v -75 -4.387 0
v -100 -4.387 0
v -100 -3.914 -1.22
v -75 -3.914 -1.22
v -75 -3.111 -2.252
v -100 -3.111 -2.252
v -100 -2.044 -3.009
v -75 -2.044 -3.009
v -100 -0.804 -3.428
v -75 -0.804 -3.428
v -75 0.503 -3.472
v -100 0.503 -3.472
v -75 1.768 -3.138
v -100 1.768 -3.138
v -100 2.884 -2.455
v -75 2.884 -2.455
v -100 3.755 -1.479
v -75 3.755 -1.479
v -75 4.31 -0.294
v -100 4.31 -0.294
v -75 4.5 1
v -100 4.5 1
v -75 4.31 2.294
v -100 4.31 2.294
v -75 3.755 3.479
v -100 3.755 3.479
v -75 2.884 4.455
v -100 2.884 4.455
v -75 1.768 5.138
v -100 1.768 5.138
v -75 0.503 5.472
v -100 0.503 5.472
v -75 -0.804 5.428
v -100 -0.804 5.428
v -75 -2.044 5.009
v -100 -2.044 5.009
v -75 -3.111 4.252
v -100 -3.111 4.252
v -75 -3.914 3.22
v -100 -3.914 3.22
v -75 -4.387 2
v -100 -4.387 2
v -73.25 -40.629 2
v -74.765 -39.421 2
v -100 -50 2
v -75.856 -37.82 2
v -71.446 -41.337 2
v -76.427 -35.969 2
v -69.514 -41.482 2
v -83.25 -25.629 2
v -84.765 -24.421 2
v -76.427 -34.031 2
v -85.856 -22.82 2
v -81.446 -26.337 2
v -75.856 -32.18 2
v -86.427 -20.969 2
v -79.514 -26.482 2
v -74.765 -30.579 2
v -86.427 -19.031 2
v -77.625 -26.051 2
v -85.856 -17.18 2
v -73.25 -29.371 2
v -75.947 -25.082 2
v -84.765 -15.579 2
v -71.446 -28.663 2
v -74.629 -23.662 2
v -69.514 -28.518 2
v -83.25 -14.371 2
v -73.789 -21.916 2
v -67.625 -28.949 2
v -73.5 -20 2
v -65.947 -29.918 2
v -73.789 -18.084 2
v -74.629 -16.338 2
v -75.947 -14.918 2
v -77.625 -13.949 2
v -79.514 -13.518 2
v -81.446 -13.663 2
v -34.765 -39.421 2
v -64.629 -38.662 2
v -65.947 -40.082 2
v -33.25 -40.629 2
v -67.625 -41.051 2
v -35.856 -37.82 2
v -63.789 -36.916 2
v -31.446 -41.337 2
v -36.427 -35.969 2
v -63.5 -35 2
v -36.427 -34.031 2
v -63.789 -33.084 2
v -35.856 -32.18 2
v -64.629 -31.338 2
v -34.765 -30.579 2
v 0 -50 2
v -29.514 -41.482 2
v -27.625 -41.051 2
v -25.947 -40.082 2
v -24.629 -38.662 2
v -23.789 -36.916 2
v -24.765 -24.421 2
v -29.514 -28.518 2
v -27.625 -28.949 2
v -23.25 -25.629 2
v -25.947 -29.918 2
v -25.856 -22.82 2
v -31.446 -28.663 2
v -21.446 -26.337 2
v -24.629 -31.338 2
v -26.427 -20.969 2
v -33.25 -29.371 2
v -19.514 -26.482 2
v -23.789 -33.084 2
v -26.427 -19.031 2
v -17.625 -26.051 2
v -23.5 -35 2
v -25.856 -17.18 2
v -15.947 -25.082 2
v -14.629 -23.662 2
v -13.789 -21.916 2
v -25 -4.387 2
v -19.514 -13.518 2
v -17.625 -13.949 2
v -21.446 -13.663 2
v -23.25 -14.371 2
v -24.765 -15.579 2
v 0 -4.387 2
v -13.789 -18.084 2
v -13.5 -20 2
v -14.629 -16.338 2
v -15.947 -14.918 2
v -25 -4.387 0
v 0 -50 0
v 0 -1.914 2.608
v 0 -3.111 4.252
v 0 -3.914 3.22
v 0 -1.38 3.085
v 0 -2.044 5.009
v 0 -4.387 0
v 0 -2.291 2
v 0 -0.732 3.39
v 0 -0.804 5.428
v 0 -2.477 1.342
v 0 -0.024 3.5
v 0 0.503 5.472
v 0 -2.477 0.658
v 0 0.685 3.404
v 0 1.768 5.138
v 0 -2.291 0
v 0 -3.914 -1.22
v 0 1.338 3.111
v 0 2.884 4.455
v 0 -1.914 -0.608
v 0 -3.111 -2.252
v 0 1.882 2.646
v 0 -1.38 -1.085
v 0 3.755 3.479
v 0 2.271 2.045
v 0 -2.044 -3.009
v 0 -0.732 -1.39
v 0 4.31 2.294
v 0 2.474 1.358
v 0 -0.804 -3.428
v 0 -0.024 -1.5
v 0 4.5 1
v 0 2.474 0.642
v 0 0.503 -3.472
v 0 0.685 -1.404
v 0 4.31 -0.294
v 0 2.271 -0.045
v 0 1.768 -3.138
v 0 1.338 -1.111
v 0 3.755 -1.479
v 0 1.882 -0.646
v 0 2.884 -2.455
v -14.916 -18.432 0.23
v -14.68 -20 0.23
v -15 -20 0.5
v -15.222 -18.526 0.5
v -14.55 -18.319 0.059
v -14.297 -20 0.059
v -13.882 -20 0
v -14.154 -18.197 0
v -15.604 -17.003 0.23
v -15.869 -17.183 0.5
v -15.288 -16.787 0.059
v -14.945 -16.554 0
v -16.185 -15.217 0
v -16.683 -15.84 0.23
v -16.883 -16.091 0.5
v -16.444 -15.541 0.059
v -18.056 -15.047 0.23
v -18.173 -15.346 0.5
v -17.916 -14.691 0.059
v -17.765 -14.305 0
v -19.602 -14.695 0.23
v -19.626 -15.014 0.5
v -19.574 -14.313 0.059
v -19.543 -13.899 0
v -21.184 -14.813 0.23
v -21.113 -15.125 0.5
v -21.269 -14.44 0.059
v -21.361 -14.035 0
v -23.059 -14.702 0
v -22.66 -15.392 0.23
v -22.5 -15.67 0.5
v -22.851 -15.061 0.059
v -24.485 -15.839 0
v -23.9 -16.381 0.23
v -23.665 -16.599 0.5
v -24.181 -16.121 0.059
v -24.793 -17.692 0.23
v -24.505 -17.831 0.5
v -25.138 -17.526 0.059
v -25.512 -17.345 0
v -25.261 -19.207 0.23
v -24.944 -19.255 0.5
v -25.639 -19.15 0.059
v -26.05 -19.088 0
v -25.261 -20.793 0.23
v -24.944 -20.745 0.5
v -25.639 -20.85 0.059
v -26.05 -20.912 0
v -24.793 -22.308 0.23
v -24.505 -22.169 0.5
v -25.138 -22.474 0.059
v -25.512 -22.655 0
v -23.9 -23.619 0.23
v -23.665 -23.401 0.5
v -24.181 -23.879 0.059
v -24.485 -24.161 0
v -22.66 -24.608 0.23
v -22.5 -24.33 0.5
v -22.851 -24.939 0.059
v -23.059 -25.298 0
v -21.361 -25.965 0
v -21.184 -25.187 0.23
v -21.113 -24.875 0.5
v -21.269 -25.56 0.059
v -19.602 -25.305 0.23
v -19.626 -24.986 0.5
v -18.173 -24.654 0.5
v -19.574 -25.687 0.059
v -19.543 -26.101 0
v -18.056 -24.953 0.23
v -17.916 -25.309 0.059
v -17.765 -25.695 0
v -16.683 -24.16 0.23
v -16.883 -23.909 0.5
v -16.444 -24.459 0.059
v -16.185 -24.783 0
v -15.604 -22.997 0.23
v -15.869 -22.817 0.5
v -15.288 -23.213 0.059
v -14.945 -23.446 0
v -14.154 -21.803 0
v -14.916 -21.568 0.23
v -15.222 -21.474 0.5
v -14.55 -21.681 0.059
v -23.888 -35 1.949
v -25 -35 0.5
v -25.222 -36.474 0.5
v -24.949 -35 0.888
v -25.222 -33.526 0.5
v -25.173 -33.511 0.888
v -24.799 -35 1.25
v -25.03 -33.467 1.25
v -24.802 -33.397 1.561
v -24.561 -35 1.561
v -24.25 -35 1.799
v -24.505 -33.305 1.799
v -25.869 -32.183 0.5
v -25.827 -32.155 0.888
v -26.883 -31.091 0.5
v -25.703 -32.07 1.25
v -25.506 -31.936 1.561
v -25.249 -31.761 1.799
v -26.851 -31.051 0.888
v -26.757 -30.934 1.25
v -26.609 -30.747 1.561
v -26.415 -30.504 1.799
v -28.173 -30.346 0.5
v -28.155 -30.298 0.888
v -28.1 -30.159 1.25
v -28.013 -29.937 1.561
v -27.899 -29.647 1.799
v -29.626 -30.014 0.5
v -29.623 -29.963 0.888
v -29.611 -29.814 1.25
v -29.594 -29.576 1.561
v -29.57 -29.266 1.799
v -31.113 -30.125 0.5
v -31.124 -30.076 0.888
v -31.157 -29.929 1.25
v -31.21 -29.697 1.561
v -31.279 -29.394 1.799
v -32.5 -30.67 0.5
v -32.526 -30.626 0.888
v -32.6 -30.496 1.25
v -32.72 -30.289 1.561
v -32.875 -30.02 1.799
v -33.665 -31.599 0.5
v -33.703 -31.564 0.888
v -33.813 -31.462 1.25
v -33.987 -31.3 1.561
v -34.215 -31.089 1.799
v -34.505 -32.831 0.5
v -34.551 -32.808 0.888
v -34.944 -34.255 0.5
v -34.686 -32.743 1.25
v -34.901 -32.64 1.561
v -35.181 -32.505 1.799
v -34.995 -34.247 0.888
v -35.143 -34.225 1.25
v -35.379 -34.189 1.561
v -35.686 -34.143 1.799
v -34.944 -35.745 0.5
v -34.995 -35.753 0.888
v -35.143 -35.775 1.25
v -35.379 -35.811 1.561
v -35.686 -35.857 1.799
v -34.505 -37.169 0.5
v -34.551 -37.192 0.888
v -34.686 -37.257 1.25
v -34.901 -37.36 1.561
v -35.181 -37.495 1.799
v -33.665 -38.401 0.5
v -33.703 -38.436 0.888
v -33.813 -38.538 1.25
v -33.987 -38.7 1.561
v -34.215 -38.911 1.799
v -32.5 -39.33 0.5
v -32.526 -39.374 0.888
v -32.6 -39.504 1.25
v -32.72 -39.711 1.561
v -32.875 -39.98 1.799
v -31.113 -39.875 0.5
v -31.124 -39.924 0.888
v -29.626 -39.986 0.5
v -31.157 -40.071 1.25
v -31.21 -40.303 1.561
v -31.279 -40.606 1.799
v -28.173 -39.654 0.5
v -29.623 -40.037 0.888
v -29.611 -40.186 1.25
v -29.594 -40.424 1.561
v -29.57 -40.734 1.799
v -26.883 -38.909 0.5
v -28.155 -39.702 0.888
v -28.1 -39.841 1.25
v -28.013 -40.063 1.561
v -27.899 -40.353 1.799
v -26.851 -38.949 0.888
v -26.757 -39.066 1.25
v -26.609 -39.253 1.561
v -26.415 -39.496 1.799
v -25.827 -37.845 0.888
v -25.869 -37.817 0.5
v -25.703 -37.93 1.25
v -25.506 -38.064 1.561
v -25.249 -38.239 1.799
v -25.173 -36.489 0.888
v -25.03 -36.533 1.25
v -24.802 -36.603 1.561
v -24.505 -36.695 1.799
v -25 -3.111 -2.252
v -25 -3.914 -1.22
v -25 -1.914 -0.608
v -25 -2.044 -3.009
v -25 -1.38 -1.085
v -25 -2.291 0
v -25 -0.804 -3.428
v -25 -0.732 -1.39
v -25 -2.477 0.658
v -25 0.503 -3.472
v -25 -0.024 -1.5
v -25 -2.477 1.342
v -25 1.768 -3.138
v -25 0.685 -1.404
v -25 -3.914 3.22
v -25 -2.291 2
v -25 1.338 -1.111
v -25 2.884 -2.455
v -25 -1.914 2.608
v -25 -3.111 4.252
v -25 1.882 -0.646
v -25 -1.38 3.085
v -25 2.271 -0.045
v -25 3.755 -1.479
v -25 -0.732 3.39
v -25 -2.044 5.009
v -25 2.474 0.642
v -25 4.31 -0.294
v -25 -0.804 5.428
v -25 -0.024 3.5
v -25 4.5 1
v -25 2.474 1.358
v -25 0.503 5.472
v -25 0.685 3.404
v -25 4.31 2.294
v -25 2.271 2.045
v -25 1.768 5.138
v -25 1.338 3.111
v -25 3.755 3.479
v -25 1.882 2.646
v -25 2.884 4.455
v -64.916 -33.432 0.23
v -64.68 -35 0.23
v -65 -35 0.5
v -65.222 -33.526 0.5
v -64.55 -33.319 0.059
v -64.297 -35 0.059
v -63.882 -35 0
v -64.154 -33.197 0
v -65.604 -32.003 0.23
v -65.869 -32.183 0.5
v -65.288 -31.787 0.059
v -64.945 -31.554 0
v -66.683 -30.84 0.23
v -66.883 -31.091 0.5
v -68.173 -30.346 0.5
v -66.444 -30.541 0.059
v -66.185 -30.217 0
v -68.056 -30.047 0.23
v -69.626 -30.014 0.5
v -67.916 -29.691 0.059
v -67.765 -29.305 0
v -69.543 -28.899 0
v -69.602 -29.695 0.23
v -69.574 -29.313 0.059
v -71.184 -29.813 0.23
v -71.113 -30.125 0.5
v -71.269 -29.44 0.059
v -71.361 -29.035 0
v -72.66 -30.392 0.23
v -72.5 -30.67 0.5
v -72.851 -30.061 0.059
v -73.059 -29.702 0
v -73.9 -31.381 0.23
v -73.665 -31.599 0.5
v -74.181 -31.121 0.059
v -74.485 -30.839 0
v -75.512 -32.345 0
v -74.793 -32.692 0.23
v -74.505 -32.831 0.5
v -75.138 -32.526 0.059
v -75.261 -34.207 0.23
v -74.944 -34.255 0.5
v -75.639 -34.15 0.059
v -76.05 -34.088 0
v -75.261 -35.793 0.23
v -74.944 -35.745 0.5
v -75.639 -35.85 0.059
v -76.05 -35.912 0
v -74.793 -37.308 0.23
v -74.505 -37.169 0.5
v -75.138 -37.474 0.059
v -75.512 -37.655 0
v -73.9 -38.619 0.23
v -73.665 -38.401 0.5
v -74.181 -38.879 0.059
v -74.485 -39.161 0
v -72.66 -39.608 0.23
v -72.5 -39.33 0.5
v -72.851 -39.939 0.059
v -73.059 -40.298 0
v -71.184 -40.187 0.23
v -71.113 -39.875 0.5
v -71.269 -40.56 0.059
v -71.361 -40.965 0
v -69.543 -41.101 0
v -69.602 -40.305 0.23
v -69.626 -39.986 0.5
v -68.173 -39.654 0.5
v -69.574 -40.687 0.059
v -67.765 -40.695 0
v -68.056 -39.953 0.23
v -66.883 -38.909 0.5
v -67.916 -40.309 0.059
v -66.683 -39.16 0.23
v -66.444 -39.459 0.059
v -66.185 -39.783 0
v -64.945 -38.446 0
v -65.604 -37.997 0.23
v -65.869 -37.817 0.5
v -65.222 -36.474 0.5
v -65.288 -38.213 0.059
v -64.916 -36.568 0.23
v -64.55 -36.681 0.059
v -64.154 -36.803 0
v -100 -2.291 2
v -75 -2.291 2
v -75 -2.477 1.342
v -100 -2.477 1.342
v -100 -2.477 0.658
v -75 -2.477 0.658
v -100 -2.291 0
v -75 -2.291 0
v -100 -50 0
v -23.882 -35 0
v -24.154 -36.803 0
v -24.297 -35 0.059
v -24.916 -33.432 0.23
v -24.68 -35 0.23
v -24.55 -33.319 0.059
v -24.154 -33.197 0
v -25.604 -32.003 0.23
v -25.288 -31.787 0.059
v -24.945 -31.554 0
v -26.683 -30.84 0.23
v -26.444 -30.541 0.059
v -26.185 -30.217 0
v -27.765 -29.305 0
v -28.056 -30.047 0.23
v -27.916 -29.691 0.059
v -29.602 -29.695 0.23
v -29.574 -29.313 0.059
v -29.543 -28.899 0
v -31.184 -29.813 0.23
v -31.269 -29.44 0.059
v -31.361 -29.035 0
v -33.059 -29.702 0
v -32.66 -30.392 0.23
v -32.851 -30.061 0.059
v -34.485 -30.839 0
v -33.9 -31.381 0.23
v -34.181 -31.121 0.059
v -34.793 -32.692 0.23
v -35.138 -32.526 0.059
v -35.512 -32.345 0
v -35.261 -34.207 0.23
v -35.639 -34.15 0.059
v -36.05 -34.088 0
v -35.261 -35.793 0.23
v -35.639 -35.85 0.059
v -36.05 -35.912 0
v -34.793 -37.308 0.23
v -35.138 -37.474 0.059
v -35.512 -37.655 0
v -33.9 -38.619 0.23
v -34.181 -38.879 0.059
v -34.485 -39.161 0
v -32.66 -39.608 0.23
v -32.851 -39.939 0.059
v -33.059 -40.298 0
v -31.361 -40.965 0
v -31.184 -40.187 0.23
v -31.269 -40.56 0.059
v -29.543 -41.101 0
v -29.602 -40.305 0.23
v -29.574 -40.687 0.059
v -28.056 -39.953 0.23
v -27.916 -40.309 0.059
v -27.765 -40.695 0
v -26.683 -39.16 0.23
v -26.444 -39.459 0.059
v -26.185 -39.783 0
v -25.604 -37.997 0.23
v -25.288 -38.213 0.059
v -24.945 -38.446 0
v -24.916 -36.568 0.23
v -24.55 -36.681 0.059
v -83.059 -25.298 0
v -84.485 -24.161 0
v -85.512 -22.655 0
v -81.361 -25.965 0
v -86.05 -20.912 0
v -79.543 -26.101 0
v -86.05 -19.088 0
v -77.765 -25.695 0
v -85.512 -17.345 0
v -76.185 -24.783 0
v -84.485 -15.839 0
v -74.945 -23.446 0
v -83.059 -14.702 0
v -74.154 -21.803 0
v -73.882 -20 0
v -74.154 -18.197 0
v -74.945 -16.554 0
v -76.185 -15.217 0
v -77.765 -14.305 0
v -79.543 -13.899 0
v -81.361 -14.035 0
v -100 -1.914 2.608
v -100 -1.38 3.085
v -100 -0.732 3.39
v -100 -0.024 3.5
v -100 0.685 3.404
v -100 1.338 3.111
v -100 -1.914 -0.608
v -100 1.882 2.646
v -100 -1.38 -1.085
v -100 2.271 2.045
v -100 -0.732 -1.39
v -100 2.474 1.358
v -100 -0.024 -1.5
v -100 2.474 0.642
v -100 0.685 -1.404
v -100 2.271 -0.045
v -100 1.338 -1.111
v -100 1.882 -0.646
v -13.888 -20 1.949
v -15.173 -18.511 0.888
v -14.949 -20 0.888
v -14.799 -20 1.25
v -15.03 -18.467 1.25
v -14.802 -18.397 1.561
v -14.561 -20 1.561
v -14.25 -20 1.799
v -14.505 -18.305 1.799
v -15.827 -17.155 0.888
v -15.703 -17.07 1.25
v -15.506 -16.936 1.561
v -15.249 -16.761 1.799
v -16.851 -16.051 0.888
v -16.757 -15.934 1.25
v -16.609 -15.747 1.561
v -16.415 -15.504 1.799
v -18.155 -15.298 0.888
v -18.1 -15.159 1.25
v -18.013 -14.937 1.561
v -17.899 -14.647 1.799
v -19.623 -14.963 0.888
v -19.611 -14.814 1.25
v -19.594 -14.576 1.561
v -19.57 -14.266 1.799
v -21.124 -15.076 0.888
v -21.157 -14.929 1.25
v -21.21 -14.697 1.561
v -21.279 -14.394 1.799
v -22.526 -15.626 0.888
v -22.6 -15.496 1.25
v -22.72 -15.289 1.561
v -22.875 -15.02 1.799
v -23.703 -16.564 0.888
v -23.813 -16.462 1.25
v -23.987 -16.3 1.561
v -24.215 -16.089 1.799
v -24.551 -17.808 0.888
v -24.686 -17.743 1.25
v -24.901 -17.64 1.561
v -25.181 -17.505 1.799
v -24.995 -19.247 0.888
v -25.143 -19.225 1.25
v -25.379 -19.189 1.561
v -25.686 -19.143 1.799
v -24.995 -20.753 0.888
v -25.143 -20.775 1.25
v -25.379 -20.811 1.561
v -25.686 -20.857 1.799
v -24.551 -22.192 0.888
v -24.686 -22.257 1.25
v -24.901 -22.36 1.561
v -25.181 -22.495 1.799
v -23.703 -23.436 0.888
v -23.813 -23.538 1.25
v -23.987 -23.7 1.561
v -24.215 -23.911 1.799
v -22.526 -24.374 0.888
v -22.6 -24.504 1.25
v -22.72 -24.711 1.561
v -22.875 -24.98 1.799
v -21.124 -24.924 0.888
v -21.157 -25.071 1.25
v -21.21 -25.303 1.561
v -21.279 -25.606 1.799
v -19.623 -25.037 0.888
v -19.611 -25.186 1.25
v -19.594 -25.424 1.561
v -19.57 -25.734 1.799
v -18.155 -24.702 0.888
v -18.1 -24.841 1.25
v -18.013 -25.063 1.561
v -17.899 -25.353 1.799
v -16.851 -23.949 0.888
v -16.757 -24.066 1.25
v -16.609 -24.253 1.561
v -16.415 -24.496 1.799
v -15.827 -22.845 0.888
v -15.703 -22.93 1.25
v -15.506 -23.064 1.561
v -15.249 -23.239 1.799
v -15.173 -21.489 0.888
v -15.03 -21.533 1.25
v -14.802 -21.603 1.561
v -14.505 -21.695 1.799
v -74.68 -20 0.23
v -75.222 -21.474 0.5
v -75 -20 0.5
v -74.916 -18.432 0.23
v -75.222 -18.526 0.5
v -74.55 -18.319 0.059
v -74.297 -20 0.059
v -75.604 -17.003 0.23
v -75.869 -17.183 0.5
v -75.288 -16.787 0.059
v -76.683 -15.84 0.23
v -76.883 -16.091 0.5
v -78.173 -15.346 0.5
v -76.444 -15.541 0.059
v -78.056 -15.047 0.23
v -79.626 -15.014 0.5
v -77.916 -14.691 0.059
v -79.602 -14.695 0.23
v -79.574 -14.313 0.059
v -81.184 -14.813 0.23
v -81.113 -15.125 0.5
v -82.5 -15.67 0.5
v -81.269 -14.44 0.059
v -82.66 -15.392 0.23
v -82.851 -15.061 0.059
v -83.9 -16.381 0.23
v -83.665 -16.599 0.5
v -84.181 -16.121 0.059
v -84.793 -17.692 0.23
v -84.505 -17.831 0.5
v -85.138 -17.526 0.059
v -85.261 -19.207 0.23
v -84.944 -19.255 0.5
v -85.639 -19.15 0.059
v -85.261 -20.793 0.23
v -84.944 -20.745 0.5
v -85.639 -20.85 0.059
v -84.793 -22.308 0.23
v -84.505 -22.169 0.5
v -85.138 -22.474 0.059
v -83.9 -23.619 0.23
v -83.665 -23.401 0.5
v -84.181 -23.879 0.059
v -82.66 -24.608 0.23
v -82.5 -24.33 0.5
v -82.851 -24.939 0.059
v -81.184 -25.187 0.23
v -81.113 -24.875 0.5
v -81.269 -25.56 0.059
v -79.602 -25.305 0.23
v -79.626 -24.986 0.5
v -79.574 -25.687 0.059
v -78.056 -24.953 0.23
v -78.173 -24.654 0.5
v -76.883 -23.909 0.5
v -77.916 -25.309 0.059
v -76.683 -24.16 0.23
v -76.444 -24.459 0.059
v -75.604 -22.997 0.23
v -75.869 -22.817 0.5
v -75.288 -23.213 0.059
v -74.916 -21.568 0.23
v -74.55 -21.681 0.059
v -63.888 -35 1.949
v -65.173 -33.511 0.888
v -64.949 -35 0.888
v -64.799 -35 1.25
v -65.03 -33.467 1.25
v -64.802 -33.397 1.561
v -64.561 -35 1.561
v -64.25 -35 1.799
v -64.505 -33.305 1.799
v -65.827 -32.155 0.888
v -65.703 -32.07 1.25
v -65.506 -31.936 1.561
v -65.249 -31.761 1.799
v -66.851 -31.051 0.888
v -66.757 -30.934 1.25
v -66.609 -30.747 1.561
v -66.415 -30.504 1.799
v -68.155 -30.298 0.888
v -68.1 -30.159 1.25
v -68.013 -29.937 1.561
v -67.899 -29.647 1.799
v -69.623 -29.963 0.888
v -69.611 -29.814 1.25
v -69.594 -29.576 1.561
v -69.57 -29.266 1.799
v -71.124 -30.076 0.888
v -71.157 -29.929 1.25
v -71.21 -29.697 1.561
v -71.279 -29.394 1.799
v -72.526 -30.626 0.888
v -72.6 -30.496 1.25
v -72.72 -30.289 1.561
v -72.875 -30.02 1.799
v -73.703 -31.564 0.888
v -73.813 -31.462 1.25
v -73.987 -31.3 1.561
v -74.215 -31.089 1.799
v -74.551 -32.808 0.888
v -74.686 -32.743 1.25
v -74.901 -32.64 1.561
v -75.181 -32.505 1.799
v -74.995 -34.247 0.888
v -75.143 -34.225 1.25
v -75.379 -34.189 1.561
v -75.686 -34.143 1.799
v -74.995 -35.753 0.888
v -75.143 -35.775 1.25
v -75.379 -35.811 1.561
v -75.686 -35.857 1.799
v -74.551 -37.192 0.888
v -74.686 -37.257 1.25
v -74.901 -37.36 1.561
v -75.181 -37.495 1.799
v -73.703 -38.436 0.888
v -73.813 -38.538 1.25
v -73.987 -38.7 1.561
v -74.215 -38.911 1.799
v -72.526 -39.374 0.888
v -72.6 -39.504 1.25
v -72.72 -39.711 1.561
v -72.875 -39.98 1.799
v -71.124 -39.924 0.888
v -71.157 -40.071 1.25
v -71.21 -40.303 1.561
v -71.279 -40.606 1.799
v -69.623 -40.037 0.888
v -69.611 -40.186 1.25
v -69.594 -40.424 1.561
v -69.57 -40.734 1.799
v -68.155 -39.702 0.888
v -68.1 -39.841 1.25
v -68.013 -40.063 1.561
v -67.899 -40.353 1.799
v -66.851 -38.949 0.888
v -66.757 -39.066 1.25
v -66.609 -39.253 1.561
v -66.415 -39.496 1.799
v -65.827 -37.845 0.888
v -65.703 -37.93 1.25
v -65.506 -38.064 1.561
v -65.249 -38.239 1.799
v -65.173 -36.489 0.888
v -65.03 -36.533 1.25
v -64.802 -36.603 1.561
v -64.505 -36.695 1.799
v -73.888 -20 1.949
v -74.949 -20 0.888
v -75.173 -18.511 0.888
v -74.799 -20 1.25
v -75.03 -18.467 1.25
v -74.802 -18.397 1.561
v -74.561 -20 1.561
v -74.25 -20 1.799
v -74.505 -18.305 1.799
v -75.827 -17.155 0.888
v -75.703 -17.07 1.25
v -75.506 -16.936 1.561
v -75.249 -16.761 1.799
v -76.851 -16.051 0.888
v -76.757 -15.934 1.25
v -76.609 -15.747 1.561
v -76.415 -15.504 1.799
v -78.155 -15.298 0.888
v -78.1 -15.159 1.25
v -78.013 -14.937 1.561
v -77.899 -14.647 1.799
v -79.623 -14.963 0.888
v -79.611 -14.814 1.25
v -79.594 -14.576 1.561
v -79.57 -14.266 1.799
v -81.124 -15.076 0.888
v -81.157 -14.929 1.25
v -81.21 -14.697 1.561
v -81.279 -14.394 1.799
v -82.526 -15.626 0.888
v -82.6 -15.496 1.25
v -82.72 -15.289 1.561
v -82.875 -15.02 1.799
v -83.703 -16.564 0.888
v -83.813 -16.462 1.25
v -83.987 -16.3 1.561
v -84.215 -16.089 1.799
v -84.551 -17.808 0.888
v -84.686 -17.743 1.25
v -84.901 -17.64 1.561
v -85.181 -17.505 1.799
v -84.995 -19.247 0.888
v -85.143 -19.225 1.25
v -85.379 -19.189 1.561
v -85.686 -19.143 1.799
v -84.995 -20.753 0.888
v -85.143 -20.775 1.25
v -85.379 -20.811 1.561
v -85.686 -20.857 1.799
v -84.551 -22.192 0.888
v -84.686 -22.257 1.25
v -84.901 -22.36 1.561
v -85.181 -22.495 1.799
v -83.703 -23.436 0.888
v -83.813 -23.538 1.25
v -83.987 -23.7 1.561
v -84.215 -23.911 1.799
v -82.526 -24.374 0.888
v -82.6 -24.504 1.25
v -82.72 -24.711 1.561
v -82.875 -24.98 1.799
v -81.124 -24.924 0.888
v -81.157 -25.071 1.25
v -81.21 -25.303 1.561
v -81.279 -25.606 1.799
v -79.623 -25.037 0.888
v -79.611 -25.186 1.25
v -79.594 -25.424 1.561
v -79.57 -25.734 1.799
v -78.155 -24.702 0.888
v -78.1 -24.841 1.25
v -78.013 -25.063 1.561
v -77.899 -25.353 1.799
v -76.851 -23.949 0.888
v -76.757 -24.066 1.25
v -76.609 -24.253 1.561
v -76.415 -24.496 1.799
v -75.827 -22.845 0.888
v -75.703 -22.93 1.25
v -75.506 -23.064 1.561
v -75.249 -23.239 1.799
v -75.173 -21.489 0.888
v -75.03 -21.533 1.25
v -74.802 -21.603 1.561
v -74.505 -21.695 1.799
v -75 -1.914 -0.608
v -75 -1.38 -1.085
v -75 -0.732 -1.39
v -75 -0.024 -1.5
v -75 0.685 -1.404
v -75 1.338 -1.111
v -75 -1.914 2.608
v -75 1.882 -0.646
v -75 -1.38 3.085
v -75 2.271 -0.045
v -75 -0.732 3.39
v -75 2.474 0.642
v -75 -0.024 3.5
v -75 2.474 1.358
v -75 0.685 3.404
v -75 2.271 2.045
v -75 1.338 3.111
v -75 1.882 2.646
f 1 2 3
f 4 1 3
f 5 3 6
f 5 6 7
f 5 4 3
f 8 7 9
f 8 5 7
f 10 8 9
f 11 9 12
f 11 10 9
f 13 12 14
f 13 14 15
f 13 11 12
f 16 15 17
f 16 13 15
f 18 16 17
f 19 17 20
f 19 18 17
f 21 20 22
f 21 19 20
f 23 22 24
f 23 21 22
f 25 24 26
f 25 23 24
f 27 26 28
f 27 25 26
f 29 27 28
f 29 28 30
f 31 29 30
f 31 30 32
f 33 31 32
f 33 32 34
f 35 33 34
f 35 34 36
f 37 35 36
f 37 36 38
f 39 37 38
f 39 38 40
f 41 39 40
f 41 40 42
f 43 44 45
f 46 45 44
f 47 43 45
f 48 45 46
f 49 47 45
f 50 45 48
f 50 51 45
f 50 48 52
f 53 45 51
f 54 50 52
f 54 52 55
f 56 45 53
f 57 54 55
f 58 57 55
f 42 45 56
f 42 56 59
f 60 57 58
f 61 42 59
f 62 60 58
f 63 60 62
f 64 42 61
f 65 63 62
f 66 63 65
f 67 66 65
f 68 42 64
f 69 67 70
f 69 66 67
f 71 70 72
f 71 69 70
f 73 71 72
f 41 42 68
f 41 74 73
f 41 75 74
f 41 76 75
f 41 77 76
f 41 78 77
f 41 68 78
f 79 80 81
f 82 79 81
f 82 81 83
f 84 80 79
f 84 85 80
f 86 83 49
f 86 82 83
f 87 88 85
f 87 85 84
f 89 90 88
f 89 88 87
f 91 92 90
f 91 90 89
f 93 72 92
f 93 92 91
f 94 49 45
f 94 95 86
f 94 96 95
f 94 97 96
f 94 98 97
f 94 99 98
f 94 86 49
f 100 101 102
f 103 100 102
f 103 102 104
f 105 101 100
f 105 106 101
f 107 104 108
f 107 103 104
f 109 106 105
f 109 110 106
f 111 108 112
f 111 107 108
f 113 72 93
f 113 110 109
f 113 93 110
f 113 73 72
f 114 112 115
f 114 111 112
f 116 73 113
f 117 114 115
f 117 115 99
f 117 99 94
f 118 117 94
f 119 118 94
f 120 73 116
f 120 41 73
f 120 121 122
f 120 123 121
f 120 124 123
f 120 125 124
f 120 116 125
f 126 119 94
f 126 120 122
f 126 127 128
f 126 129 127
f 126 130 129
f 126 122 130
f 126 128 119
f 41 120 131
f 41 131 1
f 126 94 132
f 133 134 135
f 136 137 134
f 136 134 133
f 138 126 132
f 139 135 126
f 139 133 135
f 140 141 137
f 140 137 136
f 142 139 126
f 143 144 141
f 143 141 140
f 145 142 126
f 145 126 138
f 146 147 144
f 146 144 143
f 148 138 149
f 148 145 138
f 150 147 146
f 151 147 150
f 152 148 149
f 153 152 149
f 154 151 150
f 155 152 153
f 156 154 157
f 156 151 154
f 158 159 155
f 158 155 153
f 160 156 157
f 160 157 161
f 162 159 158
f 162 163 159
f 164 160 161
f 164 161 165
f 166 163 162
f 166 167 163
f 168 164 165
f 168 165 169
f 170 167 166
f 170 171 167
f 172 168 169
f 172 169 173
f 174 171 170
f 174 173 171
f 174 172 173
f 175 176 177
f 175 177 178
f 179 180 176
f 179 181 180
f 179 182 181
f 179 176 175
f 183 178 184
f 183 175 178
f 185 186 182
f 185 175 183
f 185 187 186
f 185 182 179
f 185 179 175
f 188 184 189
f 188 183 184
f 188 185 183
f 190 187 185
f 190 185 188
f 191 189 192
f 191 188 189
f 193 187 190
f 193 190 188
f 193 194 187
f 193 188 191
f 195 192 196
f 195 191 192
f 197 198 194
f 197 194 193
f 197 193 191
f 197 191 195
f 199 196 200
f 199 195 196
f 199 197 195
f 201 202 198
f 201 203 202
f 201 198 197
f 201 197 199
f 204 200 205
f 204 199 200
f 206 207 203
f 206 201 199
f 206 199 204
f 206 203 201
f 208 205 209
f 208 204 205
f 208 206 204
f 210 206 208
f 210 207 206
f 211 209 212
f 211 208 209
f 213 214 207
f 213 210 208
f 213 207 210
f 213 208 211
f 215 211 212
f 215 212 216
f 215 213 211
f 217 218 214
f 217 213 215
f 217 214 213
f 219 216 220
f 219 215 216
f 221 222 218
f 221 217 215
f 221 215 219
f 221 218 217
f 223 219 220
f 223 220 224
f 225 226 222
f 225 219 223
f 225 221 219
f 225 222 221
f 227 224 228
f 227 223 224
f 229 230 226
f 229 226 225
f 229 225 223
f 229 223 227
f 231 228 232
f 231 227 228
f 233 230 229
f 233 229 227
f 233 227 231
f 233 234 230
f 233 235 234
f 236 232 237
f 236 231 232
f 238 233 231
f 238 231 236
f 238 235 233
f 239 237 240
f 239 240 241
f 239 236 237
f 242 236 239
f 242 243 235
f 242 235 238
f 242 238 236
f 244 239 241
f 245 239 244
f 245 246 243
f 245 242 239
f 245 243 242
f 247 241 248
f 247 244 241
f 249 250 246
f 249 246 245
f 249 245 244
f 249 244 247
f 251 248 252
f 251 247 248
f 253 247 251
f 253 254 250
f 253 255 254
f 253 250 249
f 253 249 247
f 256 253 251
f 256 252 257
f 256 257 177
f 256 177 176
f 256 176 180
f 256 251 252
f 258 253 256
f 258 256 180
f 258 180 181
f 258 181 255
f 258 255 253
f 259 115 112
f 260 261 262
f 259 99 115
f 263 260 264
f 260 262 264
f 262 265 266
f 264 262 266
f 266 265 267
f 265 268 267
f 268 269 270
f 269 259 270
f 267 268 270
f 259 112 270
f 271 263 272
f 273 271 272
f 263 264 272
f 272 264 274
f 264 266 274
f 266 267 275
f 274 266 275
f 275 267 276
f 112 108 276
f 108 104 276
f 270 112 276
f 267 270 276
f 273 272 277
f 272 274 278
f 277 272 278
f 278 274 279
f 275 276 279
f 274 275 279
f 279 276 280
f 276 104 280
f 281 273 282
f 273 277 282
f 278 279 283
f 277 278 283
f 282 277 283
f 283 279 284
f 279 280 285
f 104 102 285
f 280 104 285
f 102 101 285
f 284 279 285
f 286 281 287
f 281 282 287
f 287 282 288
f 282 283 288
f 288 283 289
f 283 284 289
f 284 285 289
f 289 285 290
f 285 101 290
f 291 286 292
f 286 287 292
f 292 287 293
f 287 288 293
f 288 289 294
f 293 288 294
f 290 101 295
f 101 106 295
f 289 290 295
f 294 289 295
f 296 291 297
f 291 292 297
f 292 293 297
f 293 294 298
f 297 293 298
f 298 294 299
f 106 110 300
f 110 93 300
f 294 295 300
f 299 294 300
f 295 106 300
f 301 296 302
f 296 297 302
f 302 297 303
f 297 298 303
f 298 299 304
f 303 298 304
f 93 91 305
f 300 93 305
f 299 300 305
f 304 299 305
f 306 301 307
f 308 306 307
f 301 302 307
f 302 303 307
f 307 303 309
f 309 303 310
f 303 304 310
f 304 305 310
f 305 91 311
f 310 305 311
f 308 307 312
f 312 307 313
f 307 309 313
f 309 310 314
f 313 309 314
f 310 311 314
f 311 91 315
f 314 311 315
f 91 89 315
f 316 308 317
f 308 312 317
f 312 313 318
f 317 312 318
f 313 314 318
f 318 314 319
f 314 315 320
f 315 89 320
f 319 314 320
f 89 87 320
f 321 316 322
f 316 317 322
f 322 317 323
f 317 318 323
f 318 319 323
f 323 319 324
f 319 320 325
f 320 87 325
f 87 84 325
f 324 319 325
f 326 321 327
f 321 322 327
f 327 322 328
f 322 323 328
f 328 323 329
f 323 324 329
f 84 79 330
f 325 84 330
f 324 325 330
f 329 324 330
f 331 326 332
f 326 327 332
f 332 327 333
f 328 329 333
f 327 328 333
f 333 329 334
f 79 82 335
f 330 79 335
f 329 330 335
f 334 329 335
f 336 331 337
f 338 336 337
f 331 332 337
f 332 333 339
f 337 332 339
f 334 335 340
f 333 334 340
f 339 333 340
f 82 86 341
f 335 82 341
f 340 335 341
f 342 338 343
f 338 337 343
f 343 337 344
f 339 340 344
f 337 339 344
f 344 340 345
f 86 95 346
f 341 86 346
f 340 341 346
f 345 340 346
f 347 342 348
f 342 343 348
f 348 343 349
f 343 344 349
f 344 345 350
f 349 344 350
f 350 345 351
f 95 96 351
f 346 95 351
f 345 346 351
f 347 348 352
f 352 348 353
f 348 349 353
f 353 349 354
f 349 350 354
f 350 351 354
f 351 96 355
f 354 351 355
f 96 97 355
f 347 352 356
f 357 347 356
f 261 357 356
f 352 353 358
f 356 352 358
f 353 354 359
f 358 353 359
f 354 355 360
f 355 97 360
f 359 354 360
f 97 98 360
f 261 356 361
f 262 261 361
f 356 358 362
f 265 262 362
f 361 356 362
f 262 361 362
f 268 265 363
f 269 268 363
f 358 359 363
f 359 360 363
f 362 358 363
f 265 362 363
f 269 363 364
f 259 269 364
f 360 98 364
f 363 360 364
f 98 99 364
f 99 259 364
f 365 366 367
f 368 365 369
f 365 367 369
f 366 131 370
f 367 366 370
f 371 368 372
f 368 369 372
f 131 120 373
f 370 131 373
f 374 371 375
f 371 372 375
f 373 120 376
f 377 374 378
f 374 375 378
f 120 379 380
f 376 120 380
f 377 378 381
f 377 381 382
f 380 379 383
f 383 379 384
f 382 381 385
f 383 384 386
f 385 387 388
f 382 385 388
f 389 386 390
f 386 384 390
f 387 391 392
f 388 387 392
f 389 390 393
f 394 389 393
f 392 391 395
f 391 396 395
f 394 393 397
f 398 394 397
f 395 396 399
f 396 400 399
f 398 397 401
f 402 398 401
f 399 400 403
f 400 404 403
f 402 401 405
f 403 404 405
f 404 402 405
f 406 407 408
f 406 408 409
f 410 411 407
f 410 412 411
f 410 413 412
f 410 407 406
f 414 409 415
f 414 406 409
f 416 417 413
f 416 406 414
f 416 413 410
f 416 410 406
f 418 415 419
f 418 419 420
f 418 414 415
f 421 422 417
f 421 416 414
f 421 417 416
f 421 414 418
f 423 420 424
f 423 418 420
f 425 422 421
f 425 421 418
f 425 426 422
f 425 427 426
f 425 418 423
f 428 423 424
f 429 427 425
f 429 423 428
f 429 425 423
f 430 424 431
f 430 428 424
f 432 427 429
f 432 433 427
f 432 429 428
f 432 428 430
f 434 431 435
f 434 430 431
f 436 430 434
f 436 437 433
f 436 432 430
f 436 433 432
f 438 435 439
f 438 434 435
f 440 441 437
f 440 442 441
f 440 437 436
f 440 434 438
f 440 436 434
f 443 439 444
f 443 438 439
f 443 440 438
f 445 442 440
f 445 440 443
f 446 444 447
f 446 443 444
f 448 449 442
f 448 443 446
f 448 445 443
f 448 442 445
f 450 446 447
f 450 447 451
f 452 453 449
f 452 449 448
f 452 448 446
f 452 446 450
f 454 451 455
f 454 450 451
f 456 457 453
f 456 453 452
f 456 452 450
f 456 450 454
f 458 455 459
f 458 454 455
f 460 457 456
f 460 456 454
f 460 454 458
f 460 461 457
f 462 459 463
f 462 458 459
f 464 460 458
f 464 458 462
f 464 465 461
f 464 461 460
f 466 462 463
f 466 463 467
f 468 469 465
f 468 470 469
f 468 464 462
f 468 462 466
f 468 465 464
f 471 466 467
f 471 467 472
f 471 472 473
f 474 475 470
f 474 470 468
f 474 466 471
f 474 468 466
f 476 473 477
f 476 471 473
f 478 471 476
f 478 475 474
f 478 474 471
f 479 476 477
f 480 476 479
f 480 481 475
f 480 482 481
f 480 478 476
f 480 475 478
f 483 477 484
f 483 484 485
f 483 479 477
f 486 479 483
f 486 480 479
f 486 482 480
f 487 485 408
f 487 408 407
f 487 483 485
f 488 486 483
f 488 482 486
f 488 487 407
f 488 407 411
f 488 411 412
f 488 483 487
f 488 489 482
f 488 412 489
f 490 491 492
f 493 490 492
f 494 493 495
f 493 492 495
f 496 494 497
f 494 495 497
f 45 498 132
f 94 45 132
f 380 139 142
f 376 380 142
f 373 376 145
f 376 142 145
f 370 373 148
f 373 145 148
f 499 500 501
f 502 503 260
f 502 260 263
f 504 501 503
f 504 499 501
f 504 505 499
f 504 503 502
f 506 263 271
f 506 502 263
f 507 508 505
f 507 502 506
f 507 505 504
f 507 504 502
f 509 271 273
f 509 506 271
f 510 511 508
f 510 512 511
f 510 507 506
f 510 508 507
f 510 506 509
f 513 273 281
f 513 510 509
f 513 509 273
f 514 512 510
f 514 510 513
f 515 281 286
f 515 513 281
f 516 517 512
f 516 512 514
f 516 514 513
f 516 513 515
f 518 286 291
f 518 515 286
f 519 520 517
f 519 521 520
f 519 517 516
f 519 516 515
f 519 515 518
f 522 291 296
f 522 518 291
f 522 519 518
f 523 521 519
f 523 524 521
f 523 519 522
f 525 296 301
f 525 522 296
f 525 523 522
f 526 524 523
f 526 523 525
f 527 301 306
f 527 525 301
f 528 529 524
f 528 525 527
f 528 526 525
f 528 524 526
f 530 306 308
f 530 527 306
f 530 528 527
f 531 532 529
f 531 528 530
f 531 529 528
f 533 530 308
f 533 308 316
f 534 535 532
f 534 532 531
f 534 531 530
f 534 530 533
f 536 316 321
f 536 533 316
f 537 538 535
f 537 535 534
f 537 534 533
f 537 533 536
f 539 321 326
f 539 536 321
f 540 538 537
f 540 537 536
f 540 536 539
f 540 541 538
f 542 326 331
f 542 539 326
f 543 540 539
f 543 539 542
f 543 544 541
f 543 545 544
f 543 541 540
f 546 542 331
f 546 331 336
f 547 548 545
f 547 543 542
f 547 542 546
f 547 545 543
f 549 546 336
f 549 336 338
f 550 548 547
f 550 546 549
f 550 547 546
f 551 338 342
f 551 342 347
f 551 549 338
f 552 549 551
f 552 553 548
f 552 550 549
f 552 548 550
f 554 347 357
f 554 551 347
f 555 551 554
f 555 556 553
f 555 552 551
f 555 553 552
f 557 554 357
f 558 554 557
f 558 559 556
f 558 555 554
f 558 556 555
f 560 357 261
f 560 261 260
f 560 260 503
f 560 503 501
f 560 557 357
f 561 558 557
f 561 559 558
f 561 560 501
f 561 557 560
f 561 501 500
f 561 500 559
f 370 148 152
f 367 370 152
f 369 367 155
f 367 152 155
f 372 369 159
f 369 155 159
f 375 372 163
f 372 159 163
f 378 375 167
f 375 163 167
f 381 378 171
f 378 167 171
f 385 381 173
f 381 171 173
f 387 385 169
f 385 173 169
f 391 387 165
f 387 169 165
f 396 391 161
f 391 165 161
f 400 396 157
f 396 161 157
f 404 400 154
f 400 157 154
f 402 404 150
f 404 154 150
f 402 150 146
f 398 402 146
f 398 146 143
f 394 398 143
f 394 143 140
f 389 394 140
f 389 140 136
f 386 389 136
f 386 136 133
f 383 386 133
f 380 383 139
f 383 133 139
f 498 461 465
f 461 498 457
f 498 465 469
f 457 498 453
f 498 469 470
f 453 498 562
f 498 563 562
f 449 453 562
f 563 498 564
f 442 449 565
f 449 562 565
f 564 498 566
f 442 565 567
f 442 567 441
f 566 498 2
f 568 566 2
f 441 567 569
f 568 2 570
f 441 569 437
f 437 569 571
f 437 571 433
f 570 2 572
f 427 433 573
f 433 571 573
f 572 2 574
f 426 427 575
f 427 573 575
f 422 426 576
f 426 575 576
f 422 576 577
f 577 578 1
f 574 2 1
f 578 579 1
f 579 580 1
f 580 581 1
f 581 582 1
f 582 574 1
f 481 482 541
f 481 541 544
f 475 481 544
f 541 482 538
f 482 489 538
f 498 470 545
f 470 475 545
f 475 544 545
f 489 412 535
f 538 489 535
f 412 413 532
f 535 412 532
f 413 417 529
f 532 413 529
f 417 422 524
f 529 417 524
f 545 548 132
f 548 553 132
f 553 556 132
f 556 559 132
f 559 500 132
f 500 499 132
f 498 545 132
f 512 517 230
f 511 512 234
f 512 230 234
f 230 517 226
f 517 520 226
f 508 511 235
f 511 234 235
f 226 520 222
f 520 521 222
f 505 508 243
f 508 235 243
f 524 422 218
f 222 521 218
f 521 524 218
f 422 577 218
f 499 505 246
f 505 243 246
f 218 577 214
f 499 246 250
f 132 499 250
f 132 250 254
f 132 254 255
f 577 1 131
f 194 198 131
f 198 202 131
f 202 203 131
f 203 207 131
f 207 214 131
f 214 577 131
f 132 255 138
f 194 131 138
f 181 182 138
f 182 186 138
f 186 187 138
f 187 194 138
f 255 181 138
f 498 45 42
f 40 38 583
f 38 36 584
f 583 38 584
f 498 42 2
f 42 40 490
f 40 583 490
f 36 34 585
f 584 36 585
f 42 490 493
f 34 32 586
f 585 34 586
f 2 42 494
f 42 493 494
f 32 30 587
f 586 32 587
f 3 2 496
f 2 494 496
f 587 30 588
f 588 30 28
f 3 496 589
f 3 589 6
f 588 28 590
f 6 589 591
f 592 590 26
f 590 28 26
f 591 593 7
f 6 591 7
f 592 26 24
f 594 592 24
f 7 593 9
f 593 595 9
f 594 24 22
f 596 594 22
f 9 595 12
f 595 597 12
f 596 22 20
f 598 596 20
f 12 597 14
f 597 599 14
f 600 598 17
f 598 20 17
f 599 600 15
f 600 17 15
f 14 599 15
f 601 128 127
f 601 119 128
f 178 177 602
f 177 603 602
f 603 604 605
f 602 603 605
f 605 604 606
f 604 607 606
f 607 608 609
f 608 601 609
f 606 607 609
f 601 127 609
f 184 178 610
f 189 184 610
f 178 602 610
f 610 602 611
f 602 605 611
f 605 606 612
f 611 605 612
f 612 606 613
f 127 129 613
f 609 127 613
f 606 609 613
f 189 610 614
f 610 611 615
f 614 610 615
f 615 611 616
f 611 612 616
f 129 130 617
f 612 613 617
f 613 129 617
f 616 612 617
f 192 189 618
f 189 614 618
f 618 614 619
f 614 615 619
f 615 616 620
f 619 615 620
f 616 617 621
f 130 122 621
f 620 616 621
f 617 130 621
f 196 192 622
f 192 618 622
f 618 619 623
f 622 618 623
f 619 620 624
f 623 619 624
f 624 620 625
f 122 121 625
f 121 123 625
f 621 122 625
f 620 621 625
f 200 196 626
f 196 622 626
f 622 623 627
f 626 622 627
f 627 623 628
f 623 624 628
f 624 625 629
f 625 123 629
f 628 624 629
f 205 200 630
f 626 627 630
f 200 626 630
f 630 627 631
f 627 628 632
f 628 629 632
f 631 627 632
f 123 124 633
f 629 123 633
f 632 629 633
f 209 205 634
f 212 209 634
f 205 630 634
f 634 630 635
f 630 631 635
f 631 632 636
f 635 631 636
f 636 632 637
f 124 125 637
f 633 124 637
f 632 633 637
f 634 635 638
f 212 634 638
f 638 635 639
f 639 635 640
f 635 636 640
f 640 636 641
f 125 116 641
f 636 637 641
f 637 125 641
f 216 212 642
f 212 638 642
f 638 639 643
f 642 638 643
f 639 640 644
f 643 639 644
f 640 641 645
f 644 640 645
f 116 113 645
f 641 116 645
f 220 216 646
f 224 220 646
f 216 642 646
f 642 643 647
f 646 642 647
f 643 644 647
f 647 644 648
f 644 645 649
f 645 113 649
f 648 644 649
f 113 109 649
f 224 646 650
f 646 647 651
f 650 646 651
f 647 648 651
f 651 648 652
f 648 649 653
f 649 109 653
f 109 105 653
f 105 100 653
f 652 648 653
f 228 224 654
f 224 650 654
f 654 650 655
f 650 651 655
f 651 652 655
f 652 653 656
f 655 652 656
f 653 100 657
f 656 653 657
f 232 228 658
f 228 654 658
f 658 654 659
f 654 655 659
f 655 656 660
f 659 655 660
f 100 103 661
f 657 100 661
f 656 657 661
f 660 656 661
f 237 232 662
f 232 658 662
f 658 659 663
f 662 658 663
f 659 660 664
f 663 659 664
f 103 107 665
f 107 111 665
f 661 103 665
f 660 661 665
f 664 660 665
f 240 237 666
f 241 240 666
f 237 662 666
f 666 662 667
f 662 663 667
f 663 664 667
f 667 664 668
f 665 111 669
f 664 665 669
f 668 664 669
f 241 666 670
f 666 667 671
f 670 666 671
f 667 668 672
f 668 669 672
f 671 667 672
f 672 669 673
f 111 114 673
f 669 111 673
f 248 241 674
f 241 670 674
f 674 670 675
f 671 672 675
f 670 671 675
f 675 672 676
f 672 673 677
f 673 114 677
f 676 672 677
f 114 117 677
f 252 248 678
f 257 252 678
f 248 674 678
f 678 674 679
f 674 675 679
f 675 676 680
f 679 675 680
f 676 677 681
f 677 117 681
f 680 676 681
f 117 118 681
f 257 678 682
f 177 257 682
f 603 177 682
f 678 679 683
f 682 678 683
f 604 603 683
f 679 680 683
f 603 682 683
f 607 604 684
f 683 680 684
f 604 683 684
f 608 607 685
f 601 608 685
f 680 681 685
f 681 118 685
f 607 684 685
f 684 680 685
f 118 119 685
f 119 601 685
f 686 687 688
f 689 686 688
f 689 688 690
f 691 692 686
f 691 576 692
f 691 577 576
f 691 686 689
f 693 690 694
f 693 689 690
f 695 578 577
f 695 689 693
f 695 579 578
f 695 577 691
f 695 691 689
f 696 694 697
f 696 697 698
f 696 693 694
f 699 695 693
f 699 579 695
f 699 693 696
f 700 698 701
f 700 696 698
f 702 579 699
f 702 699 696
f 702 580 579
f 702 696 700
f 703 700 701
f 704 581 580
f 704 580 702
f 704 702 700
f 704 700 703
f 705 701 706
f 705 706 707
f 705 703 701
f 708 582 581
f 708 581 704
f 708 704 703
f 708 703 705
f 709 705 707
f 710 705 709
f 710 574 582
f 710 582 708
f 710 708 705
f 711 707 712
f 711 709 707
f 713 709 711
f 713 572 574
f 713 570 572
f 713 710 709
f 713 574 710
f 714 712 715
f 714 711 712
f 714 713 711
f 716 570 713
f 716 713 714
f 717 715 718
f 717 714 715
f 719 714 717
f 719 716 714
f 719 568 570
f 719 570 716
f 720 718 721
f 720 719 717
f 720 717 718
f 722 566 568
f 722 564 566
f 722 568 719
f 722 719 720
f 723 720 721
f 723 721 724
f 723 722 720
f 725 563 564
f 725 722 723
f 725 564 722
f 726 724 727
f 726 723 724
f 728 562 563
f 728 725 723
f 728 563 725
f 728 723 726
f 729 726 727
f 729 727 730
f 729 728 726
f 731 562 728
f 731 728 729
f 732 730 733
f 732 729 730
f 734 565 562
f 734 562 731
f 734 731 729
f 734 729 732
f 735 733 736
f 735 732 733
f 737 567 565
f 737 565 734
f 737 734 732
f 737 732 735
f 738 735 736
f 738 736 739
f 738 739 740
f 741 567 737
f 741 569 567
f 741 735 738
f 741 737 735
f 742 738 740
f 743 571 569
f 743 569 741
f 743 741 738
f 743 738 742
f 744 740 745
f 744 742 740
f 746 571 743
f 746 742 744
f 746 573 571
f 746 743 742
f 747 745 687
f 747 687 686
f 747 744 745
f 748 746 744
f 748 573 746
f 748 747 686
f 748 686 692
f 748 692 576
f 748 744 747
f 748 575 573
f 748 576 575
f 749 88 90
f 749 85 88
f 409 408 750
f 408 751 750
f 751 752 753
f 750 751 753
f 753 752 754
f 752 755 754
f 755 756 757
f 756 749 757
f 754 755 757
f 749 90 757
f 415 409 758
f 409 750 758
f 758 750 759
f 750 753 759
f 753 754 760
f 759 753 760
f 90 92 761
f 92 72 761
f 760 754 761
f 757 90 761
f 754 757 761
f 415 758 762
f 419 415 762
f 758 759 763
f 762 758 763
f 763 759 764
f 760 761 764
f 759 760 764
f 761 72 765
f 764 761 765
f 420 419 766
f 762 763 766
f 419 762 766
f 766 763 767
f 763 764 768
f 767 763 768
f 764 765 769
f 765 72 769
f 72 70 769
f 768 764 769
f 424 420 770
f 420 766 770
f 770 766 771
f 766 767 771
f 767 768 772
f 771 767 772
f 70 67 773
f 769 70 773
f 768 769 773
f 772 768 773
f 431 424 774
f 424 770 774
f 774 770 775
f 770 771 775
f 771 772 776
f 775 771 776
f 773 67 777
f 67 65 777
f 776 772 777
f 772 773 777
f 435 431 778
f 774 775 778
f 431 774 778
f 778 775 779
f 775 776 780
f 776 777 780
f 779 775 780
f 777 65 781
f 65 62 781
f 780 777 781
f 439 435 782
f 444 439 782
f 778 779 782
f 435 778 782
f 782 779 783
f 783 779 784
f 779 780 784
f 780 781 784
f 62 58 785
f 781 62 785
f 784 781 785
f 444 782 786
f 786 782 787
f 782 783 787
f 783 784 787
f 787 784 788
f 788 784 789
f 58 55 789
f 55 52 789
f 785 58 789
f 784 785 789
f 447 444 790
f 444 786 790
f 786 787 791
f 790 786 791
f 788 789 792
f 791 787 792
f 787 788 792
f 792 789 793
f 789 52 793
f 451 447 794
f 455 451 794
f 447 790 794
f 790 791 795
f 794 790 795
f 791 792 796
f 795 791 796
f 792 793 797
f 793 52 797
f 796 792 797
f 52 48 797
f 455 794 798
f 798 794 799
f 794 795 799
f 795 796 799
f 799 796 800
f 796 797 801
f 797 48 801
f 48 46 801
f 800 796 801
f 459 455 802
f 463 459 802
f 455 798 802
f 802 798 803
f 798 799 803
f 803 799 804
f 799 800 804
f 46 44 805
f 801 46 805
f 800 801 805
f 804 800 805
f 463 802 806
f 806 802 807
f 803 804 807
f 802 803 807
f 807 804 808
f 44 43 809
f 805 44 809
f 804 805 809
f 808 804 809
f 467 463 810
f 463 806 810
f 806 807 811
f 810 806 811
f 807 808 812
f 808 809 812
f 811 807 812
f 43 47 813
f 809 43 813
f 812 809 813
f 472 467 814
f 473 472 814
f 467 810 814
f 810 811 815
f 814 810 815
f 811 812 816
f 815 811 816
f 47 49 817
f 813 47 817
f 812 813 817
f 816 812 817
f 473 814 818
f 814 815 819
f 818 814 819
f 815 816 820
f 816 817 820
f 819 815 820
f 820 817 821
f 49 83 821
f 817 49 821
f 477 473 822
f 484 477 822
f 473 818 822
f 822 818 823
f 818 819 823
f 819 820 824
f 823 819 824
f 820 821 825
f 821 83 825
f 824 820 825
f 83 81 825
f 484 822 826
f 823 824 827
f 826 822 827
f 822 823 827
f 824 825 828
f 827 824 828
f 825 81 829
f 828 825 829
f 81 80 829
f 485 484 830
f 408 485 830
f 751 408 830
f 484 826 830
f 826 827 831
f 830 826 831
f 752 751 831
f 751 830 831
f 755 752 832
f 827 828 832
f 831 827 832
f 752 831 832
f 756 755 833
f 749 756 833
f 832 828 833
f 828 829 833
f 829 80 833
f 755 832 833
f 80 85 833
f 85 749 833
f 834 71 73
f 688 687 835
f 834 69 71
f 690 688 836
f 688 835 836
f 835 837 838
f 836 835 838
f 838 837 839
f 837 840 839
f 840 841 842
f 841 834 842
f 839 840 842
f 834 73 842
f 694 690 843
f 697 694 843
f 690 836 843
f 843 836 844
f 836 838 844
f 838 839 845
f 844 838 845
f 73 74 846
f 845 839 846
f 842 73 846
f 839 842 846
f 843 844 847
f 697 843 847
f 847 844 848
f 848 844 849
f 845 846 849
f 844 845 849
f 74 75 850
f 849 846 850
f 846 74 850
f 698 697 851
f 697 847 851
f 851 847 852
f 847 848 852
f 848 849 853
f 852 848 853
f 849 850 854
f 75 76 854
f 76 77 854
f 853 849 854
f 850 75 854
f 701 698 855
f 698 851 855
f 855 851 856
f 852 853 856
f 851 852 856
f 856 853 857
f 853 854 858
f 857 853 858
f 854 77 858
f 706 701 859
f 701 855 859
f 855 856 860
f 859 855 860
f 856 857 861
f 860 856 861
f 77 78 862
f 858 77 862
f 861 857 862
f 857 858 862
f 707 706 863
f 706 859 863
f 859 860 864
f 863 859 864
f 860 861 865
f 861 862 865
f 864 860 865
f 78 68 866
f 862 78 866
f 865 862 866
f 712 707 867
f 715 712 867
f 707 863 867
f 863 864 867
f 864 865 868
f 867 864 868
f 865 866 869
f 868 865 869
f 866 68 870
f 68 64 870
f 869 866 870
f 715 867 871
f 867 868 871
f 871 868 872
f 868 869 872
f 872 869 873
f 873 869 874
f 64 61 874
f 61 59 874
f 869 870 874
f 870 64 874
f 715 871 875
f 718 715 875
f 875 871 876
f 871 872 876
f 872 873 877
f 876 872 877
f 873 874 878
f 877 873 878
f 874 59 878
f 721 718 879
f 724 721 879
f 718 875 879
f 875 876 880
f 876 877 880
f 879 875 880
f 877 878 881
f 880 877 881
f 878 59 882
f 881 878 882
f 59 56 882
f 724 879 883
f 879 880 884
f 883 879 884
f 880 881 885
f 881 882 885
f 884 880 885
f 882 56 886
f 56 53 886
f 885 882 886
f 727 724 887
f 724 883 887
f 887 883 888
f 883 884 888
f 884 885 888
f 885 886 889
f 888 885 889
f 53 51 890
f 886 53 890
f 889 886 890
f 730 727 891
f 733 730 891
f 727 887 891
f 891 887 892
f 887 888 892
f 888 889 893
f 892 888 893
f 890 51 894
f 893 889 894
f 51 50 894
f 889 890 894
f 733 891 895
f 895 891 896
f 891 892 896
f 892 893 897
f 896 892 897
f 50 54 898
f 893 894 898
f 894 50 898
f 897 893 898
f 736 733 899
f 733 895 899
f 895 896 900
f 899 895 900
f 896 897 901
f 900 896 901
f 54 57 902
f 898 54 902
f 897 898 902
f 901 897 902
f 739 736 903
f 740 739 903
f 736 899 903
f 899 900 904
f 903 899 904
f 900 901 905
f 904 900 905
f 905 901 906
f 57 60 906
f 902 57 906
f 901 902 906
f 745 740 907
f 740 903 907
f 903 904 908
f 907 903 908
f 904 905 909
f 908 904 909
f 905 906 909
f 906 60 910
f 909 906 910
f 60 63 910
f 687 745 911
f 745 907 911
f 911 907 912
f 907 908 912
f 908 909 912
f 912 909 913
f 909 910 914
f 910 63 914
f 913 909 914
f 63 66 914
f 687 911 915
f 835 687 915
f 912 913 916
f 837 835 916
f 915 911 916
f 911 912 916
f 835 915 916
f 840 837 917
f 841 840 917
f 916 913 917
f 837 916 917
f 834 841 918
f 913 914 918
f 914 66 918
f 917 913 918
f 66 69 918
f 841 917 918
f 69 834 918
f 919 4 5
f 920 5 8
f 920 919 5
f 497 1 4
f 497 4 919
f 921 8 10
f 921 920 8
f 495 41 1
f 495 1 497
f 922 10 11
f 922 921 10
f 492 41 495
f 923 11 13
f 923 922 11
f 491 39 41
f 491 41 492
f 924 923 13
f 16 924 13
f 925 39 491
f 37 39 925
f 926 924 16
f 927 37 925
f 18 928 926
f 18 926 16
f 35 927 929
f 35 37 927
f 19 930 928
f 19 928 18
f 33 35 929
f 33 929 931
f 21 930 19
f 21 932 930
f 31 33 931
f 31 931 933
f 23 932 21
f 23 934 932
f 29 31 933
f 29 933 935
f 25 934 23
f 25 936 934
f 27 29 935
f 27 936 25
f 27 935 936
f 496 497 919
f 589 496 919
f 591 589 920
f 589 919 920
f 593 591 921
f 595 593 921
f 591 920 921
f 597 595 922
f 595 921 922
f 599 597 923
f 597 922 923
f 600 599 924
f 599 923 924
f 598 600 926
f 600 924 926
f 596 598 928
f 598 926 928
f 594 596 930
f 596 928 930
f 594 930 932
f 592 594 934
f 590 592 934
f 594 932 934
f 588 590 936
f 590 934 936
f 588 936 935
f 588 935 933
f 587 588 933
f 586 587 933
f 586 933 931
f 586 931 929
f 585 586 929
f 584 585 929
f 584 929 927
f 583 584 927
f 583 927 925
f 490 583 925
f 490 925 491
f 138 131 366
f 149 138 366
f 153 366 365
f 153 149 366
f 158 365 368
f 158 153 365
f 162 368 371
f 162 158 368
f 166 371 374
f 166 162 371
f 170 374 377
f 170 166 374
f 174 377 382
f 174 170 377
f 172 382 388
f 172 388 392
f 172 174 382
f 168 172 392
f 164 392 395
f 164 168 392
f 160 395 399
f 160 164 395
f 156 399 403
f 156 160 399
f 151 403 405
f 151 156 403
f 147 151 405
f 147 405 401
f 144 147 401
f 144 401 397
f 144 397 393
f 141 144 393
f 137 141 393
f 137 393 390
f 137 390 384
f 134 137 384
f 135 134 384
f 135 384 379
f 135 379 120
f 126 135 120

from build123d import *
from build123d.topology import SkipClean

# Parameters (mm, degrees)
ESBO_O1_W                  = 100
ESBO_O1_H                  = 50
ESBO_O1_R                  = 5
RESSALTO_EXTRUS_O1_DEPTH   = 2
FILETE1_R                  = 1.5
FILETE2_R                  = 1.5
ESBO_O2_R                  = 4.5
ESBO_O2_R_2                = 2.5
RESSALTO_EXTRUS_O2_DEPTH   = 100
CORTE_EXTRUS_O1_DEPTH      = 112.938599241
CORTE_EXTRUS_O2_DEPTH      = 10
CORTE_EXTRUS_O2_DEPTH_BACK = 112.938599241
ESBO_O4_W                  = 50
ESBO_O4_H                  = 20


with BuildPart() as part:
    # Esboço1 → Ressalto-extrusão1 (new body)
    with BuildSketch(Plane.XY):
        with Locations((-50, -25)):
            Rectangle(ESBO_O1_W, ESBO_O1_H)
        with Locations((-30, -35)):
            Circle(ESBO_O1_R, mode=Mode.SUBTRACT)
        with Locations((-80, -20)):
            Circle(ESBO_O1_R, mode=Mode.SUBTRACT)
        with Locations((-70, -35)):
            Circle(ESBO_O1_R, mode=Mode.SUBTRACT)
        with Locations((-20, -20)):
            Circle(ESBO_O1_R, mode=Mode.SUBTRACT)
    extrude(amount=RESSALTO_EXTRUS_O1_DEPTH)

    # Filete1
    filete1_edges = [part.edges().sort_by_distance(p)[0] for p in [
        (-75, -35, 2),
        (-85, -20, 2),
        (-35, -35, 2),
        (-25, -20, 2),
    ]]
    fillet(filete1_edges, radius=FILETE1_R)

    # Filete2
    # the kernel refuses this fillet: 1.5 mm, written as the material it takes off along each edge
    with BuildSketch(Plane(origin=(-30, -35, 0), x_dir=(1, 0, 0), z_dir=(0, -1, 0))) as filete2_piece_1:
        with BuildLine():
            CenterArc((6.118033989, 1.5), FILETE2_R, 221.810314896, 48.189685104)
            Line((6.118033989, 0), (6.118033989, -0.03))
            Line((6.118033989, -0.03), (5, -0.03))
            Line((5, -0.03), (4.97, 0))
            ThreePointArc((4.97, 0), (4.97, 0.25), (4.97763932, 0.48))
            Line((4.97763932, 0.48), (5, 0.5))
        make_face()
    revolve(axis=Axis((-30, -35, 0), (0, 0, 1)), mode=Mode.SUBTRACT)
    with BuildSketch(Plane(origin=(-80, -20, 0), x_dir=(1, 0, 0), z_dir=(0, -1, 0))) as filete2_piece_2:
        with BuildLine():
            CenterArc((6.118033989, 1.5), FILETE2_R, 221.810314896, 48.189685104)
            Line((5, 0.5), (4.97763932, 0.48))
            ThreePointArc((4.97763932, 0.48), (4.97, 0.25), (4.97, 0))
            Line((4.97, 0), (5, -0.03))
            Line((5, -0.03), (6.118033989, -0.03))
            Line((6.118033989, -0.03), (6.118033989, 0))
        make_face()
    revolve(axis=Axis((-80, -20, 0), (0, 0, 1)), mode=Mode.SUBTRACT)
    with BuildSketch(Plane(origin=(-70, -35, 0), x_dir=(1, 0, 0), z_dir=(0, -1, 0))) as filete2_piece_3:
        with BuildLine():
            CenterArc((6.118033989, 1.5), FILETE2_R, 221.810314896, 48.189685104)
            Line((5, 0.5), (4.97763932, 0.48))
            ThreePointArc((4.97763932, 0.48), (4.97, 0.25), (4.97, 0))
            Line((4.97, 0), (5, -0.03))
            Line((5, -0.03), (6.118033989, -0.03))
            Line((6.118033989, -0.03), (6.118033989, 0))
        make_face()
    revolve(axis=Axis((-70, -35, 0), (0, 0, 1)), mode=Mode.SUBTRACT)
    with BuildSketch(Plane(origin=(-20, -20, 0), x_dir=(1, 0, 0), z_dir=(0, -1, 0))) as filete2_piece_4:
        with BuildLine():
            CenterArc((6.118033989, 1.5), FILETE2_R, 221.810314896, 48.189685104)
            Line((5, 0.5), (4.97763932, 0.48))
            ThreePointArc((4.97763932, 0.48), (4.97, 0.25), (4.97, 0))
            Line((4.97, 0), (5, -0.03))
            Line((5, -0.03), (6.118033989, -0.03))
            Line((6.118033989, -0.03), (6.118033989, 0))
        make_face()
    revolve(axis=Axis((-20, -20, 0), (0, 0, 1)), mode=Mode.SUBTRACT)

    # Esboço2 → Ressalto-extrusão2 (add, through all)
    with BuildSketch(Plane(origin=(0, 0, 0), x_dir=(0, 0, -1), z_dir=(1, 0, 0))):
        with Locations((-1, 0)):
            Circle(ESBO_O2_R)
        with Locations((-1, 0)):
            Circle(ESBO_O2_R_2, mode=Mode.SUBTRACT)
    extrude(amount=-RESSALTO_EXTRUS_O2_DEPTH)

    # Esboço3 → Corte-extrusão1 (cut, through all)
    with SkipClean():  # the faces are left unmerged after this step: merging them gives an invalid solid
        with BuildSketch(Plane(origin=(0, 0, 0), x_dir=(0, 0, -1), z_dir=(1, 0, 0))):
            with BuildLine():
                Line((-2, 0), (-2, -2.291287847))
                ThreePointArc((-2, -2.291287847), (-1, 2.5), (0, -2.291287847))
                Line((0, -2.291287847), (0, 0))
                Line((0, 0), (-2, 0))
            make_face()
            with BuildLine():
                Line((0, 0), (0, -2.291287847))
                ThreePointArc((0, -2.291287847), (1.091650066, -1.369306394), (1.5, 0))
                ThreePointArc((1.5, 0), (-2.369306394, 2.091650066), (-2, -2.291287847))
                Line((-2, -2.291287847), (-2, 0))
                Line((-2, 0), (0, 0))
            make_face()
            with BuildLine():
                ThreePointArc((-2, -2.291287847), (-1, -2.5), (0, -2.291287847))
                Line((0, -2.291287847), (0, 0))
                Line((0, 0), (-2, 0))
                Line((-2, 0), (-2, -2.291287847))
            make_face()
        extrude(amount=-CORTE_EXTRUS_O1_DEPTH, mode=Mode.SUBTRACT)

    # Esboço4 → Corte-extrusão2 (cut, two sides: drawn at the far end of the back side and taken through both)
    with BuildSketch(Plane(origin=(0, 0, 0), x_dir=(-1, 0, 0), z_dir=(0, 0, -1)).offset(-CORTE_EXTRUS_O2_DEPTH_BACK)):
        with Locations((50, 5.612517806)):
            Rectangle(ESBO_O4_W, ESBO_O4_H)
    extrude(amount=CORTE_EXTRUS_O2_DEPTH + CORTE_EXTRUS_O2_DEPTH_BACK, mode=Mode.SUBTRACT)


solid = part.part
